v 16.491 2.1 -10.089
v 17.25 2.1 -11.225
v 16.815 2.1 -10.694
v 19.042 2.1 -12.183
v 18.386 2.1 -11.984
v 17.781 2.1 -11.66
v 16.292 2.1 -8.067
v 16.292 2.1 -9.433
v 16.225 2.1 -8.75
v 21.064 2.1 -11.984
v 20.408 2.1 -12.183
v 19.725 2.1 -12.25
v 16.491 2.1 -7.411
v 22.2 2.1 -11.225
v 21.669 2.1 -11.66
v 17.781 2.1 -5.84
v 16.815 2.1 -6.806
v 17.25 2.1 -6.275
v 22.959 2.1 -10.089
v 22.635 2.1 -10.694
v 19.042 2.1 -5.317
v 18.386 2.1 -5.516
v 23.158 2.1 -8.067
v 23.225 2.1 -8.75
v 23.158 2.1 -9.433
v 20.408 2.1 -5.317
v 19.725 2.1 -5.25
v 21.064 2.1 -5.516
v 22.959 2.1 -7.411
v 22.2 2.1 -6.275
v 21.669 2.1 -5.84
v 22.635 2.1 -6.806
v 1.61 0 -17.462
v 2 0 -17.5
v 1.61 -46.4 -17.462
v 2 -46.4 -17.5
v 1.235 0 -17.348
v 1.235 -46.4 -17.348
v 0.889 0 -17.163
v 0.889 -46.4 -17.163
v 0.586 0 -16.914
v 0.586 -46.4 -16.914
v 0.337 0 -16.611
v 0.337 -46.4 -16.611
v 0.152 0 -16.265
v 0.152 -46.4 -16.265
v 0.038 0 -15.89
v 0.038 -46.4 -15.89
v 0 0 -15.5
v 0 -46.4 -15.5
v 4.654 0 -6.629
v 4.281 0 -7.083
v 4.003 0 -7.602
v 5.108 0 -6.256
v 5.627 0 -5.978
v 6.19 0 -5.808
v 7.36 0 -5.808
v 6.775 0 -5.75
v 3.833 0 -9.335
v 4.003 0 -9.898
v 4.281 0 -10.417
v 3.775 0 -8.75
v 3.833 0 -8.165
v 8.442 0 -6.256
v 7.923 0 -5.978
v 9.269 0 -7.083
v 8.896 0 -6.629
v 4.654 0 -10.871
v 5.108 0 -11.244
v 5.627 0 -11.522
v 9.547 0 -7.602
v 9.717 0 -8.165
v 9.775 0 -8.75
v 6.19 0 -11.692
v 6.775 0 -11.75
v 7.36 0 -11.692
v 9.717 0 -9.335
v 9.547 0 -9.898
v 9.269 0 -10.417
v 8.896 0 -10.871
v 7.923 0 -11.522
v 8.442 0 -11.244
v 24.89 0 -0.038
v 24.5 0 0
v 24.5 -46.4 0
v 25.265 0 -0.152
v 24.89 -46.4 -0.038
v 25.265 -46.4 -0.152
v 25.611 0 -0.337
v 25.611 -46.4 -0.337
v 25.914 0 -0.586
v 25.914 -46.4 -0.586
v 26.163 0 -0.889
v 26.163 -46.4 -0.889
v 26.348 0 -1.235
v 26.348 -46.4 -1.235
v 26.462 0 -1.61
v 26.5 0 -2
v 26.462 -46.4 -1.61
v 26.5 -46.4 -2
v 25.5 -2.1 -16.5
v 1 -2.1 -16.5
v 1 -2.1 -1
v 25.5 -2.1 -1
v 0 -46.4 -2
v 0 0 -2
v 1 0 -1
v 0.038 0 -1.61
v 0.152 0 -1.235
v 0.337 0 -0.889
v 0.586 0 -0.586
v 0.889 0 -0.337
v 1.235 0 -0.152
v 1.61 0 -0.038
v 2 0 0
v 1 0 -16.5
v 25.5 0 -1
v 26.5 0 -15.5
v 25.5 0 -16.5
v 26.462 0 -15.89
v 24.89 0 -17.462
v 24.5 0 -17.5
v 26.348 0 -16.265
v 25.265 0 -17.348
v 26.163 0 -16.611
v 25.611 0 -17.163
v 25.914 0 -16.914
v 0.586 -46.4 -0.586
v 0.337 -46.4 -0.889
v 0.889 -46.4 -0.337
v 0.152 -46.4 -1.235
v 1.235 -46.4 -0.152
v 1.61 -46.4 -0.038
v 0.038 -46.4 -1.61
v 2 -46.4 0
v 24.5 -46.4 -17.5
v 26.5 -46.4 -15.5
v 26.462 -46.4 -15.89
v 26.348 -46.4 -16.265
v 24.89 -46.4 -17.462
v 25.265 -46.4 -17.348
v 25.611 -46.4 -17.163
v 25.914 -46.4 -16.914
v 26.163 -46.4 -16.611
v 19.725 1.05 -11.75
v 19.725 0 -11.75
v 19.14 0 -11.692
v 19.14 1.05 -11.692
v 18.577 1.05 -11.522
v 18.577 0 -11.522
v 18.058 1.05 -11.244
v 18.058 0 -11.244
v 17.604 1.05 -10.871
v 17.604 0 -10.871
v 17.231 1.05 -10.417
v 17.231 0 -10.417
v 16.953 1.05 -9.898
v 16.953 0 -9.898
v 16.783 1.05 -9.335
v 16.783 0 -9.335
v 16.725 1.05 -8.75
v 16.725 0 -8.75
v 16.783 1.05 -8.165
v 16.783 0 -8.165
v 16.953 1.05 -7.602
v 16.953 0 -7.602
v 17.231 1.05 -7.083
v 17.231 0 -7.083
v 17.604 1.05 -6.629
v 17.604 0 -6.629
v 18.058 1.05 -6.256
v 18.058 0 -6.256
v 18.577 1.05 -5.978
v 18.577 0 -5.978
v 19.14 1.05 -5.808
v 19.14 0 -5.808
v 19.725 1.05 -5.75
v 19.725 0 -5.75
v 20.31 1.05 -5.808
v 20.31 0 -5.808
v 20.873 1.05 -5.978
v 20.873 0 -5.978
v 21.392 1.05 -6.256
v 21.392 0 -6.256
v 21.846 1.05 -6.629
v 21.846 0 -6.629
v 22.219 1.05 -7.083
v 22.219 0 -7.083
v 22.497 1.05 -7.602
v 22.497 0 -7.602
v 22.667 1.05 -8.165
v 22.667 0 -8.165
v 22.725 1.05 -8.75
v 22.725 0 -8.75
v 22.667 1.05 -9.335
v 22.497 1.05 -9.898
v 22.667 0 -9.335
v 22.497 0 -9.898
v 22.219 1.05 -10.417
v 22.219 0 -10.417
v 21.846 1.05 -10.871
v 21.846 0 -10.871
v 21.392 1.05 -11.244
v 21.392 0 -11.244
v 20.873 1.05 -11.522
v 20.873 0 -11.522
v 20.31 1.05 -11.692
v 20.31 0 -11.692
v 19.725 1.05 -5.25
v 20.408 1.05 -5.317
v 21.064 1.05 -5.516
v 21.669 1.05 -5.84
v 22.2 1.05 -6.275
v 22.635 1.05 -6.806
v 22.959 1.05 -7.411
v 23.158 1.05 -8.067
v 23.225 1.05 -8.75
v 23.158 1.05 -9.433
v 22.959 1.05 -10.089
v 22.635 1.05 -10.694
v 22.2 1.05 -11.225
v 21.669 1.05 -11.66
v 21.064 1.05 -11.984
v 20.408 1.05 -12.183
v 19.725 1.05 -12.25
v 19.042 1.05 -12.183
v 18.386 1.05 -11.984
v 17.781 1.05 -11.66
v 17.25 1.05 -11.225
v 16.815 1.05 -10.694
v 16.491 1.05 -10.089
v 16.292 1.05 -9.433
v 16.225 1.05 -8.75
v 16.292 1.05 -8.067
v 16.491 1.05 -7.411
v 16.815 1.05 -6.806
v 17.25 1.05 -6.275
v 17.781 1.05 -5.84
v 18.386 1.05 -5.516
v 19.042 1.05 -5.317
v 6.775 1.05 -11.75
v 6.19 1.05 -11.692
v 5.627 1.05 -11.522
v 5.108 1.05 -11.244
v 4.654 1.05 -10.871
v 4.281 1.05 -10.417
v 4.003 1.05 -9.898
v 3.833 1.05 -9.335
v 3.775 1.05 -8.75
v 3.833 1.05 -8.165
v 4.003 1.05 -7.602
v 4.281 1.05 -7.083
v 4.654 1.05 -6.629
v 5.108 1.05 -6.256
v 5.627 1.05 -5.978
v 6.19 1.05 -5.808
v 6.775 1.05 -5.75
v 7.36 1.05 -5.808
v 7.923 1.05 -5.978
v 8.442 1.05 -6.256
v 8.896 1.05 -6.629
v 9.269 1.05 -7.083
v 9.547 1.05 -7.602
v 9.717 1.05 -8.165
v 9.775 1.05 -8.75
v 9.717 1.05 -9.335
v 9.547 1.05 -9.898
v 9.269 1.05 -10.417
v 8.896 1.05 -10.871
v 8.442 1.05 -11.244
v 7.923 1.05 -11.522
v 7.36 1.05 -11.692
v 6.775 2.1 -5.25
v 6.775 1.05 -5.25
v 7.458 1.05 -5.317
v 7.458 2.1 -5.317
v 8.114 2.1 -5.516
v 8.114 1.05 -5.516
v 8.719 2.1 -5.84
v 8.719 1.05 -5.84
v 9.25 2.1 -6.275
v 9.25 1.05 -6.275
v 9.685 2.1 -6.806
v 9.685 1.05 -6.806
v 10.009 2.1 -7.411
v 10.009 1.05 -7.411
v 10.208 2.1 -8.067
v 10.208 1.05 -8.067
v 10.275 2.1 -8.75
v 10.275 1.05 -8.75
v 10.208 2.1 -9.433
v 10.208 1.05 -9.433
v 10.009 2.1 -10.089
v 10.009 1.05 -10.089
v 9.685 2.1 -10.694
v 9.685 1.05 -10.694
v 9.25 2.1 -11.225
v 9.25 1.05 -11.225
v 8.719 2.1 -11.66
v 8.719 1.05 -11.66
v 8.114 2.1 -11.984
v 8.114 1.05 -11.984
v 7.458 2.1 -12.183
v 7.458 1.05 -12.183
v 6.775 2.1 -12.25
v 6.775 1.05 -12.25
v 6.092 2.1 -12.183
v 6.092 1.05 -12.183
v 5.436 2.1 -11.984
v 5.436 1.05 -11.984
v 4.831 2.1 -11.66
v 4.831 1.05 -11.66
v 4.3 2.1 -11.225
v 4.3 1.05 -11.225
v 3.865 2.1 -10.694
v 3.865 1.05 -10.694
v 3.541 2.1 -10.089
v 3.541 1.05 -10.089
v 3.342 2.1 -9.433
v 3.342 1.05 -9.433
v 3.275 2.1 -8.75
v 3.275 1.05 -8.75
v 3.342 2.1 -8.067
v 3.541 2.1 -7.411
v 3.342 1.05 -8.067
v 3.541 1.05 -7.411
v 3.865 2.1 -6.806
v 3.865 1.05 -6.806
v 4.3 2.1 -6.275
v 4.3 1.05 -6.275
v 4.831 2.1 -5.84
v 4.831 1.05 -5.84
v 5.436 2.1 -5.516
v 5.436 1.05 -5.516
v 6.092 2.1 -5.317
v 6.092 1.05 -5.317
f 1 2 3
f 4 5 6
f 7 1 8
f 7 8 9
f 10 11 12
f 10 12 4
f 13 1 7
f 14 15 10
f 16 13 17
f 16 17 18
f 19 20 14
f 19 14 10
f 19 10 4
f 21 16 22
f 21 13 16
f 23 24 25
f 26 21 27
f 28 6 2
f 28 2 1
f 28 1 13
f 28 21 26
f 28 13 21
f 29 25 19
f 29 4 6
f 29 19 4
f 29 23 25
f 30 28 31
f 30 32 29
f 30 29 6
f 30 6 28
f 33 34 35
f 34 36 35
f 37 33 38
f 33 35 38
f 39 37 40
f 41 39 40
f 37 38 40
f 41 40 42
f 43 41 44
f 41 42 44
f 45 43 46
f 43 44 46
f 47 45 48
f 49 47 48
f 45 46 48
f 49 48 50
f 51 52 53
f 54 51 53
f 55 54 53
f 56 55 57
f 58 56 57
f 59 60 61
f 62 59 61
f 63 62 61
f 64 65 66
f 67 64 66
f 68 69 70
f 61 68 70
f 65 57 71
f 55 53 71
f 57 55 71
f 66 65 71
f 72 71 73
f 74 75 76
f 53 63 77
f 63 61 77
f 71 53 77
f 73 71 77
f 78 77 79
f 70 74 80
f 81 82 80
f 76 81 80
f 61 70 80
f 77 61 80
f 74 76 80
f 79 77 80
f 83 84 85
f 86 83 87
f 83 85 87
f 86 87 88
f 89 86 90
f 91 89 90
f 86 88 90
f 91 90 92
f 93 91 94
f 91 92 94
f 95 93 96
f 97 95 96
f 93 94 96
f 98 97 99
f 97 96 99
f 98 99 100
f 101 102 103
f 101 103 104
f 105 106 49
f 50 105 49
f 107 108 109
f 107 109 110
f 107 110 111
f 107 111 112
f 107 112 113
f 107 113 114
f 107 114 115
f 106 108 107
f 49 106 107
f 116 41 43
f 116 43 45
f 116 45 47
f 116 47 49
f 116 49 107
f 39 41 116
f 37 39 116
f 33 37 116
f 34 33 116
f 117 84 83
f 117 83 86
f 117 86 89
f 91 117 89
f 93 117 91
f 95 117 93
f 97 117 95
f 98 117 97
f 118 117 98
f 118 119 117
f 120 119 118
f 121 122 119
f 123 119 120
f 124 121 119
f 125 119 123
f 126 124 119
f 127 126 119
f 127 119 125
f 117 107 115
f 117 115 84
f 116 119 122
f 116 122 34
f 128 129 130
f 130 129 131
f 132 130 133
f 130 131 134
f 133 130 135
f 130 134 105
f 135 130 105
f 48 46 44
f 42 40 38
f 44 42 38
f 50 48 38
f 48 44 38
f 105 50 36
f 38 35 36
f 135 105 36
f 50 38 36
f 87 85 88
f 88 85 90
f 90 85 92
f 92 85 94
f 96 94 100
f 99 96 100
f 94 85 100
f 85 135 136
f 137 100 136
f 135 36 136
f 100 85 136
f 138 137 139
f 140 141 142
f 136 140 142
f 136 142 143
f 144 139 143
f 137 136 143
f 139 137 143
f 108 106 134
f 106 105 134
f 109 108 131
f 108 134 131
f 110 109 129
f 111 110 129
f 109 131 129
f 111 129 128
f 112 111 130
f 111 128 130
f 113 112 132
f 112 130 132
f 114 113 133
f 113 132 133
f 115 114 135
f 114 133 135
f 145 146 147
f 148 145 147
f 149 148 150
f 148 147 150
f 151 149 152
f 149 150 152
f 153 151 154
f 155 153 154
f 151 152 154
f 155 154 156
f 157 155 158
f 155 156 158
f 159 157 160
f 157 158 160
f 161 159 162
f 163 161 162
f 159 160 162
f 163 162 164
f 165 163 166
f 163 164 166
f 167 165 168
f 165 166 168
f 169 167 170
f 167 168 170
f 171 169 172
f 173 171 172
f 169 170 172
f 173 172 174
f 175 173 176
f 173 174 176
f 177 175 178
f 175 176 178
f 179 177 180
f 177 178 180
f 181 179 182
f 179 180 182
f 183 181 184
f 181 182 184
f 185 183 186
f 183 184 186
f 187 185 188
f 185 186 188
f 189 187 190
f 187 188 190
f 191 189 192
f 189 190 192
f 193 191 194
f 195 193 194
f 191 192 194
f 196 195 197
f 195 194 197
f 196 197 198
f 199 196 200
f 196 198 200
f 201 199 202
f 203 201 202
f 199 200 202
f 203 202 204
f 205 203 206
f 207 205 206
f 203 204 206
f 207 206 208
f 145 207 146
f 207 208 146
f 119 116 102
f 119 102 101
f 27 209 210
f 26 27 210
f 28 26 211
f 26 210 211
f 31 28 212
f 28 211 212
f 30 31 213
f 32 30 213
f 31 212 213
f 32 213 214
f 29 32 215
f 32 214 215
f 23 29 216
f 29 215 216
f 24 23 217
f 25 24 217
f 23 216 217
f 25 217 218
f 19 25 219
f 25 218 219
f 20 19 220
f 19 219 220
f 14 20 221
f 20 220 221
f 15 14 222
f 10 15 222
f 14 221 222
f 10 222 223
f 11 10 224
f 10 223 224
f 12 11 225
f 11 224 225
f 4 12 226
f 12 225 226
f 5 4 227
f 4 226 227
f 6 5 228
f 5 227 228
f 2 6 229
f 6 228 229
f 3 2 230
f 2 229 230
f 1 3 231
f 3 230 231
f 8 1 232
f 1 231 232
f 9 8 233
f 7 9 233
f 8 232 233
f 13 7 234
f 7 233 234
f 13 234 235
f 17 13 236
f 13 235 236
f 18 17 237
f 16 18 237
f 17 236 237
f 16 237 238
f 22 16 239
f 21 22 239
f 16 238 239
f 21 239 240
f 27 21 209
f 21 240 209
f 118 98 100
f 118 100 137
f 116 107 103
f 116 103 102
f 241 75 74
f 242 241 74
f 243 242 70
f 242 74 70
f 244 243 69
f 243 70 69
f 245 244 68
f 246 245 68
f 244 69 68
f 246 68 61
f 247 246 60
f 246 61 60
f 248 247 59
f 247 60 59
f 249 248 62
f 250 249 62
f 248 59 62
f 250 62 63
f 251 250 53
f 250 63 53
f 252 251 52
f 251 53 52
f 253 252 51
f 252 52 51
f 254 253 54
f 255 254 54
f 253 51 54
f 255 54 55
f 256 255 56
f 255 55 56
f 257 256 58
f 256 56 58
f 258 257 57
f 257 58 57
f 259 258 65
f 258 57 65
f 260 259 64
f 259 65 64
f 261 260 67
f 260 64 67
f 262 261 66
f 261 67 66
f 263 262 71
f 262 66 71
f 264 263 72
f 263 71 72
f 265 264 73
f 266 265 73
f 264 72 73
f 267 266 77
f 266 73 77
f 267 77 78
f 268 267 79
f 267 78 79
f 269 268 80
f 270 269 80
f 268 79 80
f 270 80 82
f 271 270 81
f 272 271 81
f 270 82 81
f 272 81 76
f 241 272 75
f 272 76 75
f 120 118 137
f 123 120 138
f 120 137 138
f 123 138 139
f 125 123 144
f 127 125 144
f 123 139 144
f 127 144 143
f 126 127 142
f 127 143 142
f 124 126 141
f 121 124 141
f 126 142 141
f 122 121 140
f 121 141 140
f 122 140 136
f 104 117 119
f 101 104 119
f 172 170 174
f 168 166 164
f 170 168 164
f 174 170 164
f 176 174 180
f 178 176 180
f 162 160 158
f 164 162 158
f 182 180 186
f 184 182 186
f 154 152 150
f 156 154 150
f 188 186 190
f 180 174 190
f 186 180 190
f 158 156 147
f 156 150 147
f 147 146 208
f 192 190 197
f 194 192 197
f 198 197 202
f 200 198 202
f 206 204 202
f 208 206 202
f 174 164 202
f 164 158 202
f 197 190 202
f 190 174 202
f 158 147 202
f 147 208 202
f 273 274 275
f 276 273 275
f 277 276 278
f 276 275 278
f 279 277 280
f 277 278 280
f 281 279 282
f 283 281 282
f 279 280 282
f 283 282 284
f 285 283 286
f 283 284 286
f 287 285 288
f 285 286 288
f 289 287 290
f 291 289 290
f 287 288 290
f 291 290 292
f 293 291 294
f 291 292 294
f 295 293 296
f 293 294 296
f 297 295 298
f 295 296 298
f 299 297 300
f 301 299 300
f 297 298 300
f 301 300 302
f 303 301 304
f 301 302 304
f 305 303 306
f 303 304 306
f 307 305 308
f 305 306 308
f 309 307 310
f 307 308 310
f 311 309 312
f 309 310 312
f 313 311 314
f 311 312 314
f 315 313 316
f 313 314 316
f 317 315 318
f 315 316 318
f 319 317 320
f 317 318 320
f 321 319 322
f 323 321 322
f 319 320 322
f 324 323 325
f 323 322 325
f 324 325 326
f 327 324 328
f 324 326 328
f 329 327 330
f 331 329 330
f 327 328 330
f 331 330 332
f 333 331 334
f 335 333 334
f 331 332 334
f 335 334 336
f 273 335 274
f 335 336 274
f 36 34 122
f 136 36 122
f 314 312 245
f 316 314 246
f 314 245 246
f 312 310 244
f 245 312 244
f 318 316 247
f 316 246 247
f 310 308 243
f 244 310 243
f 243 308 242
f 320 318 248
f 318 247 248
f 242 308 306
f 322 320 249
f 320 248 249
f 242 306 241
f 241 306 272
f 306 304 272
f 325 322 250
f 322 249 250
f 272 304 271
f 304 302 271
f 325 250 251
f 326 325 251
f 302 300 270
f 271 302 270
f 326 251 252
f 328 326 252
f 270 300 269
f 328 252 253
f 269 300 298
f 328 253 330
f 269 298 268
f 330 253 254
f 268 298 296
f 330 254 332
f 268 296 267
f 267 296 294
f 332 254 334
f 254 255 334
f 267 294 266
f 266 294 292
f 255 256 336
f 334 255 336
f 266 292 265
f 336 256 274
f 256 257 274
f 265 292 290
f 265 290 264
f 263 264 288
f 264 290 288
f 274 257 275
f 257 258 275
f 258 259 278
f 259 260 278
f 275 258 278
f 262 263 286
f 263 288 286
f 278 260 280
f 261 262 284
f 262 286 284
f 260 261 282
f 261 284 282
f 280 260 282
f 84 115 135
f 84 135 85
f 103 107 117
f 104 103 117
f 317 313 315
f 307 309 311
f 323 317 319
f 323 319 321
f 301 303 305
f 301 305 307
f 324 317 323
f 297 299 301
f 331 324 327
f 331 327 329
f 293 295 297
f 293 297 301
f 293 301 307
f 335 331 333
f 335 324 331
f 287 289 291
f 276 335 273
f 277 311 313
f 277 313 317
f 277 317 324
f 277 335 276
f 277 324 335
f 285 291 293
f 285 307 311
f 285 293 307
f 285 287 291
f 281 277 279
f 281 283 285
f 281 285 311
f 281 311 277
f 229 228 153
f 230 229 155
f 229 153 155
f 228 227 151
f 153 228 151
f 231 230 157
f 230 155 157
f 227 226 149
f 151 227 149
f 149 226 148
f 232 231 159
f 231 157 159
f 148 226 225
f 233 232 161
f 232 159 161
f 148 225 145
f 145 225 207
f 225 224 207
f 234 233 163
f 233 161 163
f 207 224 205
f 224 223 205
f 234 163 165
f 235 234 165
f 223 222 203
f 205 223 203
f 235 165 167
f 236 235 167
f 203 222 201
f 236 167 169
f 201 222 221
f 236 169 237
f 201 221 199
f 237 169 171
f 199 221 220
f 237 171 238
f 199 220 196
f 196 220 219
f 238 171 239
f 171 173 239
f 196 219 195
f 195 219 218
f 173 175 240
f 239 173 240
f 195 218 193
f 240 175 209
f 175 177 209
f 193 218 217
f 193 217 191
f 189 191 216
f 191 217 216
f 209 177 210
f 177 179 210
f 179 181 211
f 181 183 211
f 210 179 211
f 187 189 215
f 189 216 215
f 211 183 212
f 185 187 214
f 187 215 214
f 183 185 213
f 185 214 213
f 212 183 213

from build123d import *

# Parameters (mm, degrees)
SKETCH2_W           = 26.5
SKETCH2_H           = 17.5
BOSS_EXTRUDE1_DEPTH = 46.4
SKETCH4_R           = 3
BOSS_EXTRUDE5_DEPTH = 1.05
SKETCH5_R           = 3.5
BOSS_EXTRUDE6_DEPTH = 1.05
SKETCH6_R           = 3.5
BOSS_EXTRUDE7_DEPTH = 1.05
SKETCH9_W           = 24.5
SKETCH9_H           = 15.5
CUT_EXTRUDE2_DEPTH  = 2.1
FILLET1_R           = 2
FILLET2_R           = 2
FILLET3_R           = 2
FILLET4_R           = 2


with BuildPart() as part:
    # Sketch2 → Boss-Extrude1 (new body)
    with BuildSketch(Plane(origin=(0, 0, 0), x_dir=(1, 0, 0), z_dir=(0, 1, 0))):
        with Locations((13.25, 8.75)):
            Rectangle(SKETCH2_W, SKETCH2_H)
    extrude(amount=-BOSS_EXTRUDE1_DEPTH)

    # Sketch4 → Boss-Extrude5 (add)
    with BuildSketch(Plane(origin=(0, 0, 0), x_dir=(1, 0, 0), z_dir=(0, 1, 0))):
        with Locations(Location((19.725, 8.75, 0), (0, 0, 90))):
            Circle(SKETCH4_R)
        with Locations(Location((6.775, 8.75, 0), (0, 0, 90))):
            Circle(SKETCH4_R)
    extrude(amount=BOSS_EXTRUDE5_DEPTH)

    # Sketch5 → Boss-Extrude6 (add)
    with BuildSketch(Plane(origin=(0, 1.05, 0), x_dir=(1, 0, 0), z_dir=(0, 1, 0))):
        with Locations(Location((6.775, 8.75, 0), (0, 0, 270))):
            Circle(SKETCH5_R)
    extrude(amount=BOSS_EXTRUDE6_DEPTH)

    # Sketch6 → Boss-Extrude7 (add)
    with BuildSketch(Plane(origin=(0, 1.05, 0), x_dir=(1, 0, 0), z_dir=(0, 1, 0))):
        with Locations(Location((19.725, 8.75, 0), (0, 0, 270))):
            Circle(SKETCH6_R)
    extrude(amount=BOSS_EXTRUDE7_DEPTH)

    # Sketch9 → Cut-Extrude2 (cut)
    with BuildSketch(Plane(origin=(0, 0, 0), x_dir=(1, 0, 0), z_dir=(0, 1, 0))):
        with Locations((13.25, 8.75)):
            Rectangle(SKETCH9_W, SKETCH9_H)
    extrude(amount=-CUT_EXTRUDE2_DEPTH, mode=Mode.SUBTRACT)


with BuildPart() as cut_extrude2_piece_1:
    # of the separate pieces the step leaves, piece 1, a body of its own (cut_extrude2_pieces)
    add(part.part.solids().sort_by_distance((0, 0, 0))[0])

    # Fillet1
    fillet1_edges = [cut_extrude2_piece_1.edges().sort_by_distance(p)[0] for p in [
        (26.5, -23.2, 0),
    ]]
    fillet(fillet1_edges, radius=FILLET1_R)

    # Fillet2
    fillet2_edges = [cut_extrude2_piece_1.edges().sort_by_distance(p)[0] for p in [
        (26.5, -23.2, -17.5),
    ]]
    fillet(fillet2_edges, radius=FILLET2_R)

    # Fillet3
    fillet3_edges = [cut_extrude2_piece_1.edges().sort_by_distance(p)[0] for p in [
        (0, -23.2, -17.5),
    ]]
    fillet(fillet3_edges, radius=FILLET3_R)

    # Fillet4
    fillet4_edges = [cut_extrude2_piece_1.edges().sort_by_distance(p)[0] for p in [
        (0, -23.2, 0),
    ]]
    fillet(fillet4_edges, radius=FILLET4_R)


with BuildPart() as cut_extrude2_piece_2:
    # of the separate pieces the step leaves, piece 2, a body of its own (cut_extrude2_pieces)
    add(part.part.solids().sort_by_distance((6.775, 0, -11.75))[0])


with BuildPart() as cut_extrude2_piece_3:
    # of the separate pieces the step leaves, piece 3, a body of its own (cut_extrude2_pieces)
    add(part.part.solids().sort_by_distance((19.725, 1.05, -5.25))[0])


solid = Compound([cut_extrude2_piece_1.part, cut_extrude2_piece_2.part, cut_extrude2_piece_3.part])
